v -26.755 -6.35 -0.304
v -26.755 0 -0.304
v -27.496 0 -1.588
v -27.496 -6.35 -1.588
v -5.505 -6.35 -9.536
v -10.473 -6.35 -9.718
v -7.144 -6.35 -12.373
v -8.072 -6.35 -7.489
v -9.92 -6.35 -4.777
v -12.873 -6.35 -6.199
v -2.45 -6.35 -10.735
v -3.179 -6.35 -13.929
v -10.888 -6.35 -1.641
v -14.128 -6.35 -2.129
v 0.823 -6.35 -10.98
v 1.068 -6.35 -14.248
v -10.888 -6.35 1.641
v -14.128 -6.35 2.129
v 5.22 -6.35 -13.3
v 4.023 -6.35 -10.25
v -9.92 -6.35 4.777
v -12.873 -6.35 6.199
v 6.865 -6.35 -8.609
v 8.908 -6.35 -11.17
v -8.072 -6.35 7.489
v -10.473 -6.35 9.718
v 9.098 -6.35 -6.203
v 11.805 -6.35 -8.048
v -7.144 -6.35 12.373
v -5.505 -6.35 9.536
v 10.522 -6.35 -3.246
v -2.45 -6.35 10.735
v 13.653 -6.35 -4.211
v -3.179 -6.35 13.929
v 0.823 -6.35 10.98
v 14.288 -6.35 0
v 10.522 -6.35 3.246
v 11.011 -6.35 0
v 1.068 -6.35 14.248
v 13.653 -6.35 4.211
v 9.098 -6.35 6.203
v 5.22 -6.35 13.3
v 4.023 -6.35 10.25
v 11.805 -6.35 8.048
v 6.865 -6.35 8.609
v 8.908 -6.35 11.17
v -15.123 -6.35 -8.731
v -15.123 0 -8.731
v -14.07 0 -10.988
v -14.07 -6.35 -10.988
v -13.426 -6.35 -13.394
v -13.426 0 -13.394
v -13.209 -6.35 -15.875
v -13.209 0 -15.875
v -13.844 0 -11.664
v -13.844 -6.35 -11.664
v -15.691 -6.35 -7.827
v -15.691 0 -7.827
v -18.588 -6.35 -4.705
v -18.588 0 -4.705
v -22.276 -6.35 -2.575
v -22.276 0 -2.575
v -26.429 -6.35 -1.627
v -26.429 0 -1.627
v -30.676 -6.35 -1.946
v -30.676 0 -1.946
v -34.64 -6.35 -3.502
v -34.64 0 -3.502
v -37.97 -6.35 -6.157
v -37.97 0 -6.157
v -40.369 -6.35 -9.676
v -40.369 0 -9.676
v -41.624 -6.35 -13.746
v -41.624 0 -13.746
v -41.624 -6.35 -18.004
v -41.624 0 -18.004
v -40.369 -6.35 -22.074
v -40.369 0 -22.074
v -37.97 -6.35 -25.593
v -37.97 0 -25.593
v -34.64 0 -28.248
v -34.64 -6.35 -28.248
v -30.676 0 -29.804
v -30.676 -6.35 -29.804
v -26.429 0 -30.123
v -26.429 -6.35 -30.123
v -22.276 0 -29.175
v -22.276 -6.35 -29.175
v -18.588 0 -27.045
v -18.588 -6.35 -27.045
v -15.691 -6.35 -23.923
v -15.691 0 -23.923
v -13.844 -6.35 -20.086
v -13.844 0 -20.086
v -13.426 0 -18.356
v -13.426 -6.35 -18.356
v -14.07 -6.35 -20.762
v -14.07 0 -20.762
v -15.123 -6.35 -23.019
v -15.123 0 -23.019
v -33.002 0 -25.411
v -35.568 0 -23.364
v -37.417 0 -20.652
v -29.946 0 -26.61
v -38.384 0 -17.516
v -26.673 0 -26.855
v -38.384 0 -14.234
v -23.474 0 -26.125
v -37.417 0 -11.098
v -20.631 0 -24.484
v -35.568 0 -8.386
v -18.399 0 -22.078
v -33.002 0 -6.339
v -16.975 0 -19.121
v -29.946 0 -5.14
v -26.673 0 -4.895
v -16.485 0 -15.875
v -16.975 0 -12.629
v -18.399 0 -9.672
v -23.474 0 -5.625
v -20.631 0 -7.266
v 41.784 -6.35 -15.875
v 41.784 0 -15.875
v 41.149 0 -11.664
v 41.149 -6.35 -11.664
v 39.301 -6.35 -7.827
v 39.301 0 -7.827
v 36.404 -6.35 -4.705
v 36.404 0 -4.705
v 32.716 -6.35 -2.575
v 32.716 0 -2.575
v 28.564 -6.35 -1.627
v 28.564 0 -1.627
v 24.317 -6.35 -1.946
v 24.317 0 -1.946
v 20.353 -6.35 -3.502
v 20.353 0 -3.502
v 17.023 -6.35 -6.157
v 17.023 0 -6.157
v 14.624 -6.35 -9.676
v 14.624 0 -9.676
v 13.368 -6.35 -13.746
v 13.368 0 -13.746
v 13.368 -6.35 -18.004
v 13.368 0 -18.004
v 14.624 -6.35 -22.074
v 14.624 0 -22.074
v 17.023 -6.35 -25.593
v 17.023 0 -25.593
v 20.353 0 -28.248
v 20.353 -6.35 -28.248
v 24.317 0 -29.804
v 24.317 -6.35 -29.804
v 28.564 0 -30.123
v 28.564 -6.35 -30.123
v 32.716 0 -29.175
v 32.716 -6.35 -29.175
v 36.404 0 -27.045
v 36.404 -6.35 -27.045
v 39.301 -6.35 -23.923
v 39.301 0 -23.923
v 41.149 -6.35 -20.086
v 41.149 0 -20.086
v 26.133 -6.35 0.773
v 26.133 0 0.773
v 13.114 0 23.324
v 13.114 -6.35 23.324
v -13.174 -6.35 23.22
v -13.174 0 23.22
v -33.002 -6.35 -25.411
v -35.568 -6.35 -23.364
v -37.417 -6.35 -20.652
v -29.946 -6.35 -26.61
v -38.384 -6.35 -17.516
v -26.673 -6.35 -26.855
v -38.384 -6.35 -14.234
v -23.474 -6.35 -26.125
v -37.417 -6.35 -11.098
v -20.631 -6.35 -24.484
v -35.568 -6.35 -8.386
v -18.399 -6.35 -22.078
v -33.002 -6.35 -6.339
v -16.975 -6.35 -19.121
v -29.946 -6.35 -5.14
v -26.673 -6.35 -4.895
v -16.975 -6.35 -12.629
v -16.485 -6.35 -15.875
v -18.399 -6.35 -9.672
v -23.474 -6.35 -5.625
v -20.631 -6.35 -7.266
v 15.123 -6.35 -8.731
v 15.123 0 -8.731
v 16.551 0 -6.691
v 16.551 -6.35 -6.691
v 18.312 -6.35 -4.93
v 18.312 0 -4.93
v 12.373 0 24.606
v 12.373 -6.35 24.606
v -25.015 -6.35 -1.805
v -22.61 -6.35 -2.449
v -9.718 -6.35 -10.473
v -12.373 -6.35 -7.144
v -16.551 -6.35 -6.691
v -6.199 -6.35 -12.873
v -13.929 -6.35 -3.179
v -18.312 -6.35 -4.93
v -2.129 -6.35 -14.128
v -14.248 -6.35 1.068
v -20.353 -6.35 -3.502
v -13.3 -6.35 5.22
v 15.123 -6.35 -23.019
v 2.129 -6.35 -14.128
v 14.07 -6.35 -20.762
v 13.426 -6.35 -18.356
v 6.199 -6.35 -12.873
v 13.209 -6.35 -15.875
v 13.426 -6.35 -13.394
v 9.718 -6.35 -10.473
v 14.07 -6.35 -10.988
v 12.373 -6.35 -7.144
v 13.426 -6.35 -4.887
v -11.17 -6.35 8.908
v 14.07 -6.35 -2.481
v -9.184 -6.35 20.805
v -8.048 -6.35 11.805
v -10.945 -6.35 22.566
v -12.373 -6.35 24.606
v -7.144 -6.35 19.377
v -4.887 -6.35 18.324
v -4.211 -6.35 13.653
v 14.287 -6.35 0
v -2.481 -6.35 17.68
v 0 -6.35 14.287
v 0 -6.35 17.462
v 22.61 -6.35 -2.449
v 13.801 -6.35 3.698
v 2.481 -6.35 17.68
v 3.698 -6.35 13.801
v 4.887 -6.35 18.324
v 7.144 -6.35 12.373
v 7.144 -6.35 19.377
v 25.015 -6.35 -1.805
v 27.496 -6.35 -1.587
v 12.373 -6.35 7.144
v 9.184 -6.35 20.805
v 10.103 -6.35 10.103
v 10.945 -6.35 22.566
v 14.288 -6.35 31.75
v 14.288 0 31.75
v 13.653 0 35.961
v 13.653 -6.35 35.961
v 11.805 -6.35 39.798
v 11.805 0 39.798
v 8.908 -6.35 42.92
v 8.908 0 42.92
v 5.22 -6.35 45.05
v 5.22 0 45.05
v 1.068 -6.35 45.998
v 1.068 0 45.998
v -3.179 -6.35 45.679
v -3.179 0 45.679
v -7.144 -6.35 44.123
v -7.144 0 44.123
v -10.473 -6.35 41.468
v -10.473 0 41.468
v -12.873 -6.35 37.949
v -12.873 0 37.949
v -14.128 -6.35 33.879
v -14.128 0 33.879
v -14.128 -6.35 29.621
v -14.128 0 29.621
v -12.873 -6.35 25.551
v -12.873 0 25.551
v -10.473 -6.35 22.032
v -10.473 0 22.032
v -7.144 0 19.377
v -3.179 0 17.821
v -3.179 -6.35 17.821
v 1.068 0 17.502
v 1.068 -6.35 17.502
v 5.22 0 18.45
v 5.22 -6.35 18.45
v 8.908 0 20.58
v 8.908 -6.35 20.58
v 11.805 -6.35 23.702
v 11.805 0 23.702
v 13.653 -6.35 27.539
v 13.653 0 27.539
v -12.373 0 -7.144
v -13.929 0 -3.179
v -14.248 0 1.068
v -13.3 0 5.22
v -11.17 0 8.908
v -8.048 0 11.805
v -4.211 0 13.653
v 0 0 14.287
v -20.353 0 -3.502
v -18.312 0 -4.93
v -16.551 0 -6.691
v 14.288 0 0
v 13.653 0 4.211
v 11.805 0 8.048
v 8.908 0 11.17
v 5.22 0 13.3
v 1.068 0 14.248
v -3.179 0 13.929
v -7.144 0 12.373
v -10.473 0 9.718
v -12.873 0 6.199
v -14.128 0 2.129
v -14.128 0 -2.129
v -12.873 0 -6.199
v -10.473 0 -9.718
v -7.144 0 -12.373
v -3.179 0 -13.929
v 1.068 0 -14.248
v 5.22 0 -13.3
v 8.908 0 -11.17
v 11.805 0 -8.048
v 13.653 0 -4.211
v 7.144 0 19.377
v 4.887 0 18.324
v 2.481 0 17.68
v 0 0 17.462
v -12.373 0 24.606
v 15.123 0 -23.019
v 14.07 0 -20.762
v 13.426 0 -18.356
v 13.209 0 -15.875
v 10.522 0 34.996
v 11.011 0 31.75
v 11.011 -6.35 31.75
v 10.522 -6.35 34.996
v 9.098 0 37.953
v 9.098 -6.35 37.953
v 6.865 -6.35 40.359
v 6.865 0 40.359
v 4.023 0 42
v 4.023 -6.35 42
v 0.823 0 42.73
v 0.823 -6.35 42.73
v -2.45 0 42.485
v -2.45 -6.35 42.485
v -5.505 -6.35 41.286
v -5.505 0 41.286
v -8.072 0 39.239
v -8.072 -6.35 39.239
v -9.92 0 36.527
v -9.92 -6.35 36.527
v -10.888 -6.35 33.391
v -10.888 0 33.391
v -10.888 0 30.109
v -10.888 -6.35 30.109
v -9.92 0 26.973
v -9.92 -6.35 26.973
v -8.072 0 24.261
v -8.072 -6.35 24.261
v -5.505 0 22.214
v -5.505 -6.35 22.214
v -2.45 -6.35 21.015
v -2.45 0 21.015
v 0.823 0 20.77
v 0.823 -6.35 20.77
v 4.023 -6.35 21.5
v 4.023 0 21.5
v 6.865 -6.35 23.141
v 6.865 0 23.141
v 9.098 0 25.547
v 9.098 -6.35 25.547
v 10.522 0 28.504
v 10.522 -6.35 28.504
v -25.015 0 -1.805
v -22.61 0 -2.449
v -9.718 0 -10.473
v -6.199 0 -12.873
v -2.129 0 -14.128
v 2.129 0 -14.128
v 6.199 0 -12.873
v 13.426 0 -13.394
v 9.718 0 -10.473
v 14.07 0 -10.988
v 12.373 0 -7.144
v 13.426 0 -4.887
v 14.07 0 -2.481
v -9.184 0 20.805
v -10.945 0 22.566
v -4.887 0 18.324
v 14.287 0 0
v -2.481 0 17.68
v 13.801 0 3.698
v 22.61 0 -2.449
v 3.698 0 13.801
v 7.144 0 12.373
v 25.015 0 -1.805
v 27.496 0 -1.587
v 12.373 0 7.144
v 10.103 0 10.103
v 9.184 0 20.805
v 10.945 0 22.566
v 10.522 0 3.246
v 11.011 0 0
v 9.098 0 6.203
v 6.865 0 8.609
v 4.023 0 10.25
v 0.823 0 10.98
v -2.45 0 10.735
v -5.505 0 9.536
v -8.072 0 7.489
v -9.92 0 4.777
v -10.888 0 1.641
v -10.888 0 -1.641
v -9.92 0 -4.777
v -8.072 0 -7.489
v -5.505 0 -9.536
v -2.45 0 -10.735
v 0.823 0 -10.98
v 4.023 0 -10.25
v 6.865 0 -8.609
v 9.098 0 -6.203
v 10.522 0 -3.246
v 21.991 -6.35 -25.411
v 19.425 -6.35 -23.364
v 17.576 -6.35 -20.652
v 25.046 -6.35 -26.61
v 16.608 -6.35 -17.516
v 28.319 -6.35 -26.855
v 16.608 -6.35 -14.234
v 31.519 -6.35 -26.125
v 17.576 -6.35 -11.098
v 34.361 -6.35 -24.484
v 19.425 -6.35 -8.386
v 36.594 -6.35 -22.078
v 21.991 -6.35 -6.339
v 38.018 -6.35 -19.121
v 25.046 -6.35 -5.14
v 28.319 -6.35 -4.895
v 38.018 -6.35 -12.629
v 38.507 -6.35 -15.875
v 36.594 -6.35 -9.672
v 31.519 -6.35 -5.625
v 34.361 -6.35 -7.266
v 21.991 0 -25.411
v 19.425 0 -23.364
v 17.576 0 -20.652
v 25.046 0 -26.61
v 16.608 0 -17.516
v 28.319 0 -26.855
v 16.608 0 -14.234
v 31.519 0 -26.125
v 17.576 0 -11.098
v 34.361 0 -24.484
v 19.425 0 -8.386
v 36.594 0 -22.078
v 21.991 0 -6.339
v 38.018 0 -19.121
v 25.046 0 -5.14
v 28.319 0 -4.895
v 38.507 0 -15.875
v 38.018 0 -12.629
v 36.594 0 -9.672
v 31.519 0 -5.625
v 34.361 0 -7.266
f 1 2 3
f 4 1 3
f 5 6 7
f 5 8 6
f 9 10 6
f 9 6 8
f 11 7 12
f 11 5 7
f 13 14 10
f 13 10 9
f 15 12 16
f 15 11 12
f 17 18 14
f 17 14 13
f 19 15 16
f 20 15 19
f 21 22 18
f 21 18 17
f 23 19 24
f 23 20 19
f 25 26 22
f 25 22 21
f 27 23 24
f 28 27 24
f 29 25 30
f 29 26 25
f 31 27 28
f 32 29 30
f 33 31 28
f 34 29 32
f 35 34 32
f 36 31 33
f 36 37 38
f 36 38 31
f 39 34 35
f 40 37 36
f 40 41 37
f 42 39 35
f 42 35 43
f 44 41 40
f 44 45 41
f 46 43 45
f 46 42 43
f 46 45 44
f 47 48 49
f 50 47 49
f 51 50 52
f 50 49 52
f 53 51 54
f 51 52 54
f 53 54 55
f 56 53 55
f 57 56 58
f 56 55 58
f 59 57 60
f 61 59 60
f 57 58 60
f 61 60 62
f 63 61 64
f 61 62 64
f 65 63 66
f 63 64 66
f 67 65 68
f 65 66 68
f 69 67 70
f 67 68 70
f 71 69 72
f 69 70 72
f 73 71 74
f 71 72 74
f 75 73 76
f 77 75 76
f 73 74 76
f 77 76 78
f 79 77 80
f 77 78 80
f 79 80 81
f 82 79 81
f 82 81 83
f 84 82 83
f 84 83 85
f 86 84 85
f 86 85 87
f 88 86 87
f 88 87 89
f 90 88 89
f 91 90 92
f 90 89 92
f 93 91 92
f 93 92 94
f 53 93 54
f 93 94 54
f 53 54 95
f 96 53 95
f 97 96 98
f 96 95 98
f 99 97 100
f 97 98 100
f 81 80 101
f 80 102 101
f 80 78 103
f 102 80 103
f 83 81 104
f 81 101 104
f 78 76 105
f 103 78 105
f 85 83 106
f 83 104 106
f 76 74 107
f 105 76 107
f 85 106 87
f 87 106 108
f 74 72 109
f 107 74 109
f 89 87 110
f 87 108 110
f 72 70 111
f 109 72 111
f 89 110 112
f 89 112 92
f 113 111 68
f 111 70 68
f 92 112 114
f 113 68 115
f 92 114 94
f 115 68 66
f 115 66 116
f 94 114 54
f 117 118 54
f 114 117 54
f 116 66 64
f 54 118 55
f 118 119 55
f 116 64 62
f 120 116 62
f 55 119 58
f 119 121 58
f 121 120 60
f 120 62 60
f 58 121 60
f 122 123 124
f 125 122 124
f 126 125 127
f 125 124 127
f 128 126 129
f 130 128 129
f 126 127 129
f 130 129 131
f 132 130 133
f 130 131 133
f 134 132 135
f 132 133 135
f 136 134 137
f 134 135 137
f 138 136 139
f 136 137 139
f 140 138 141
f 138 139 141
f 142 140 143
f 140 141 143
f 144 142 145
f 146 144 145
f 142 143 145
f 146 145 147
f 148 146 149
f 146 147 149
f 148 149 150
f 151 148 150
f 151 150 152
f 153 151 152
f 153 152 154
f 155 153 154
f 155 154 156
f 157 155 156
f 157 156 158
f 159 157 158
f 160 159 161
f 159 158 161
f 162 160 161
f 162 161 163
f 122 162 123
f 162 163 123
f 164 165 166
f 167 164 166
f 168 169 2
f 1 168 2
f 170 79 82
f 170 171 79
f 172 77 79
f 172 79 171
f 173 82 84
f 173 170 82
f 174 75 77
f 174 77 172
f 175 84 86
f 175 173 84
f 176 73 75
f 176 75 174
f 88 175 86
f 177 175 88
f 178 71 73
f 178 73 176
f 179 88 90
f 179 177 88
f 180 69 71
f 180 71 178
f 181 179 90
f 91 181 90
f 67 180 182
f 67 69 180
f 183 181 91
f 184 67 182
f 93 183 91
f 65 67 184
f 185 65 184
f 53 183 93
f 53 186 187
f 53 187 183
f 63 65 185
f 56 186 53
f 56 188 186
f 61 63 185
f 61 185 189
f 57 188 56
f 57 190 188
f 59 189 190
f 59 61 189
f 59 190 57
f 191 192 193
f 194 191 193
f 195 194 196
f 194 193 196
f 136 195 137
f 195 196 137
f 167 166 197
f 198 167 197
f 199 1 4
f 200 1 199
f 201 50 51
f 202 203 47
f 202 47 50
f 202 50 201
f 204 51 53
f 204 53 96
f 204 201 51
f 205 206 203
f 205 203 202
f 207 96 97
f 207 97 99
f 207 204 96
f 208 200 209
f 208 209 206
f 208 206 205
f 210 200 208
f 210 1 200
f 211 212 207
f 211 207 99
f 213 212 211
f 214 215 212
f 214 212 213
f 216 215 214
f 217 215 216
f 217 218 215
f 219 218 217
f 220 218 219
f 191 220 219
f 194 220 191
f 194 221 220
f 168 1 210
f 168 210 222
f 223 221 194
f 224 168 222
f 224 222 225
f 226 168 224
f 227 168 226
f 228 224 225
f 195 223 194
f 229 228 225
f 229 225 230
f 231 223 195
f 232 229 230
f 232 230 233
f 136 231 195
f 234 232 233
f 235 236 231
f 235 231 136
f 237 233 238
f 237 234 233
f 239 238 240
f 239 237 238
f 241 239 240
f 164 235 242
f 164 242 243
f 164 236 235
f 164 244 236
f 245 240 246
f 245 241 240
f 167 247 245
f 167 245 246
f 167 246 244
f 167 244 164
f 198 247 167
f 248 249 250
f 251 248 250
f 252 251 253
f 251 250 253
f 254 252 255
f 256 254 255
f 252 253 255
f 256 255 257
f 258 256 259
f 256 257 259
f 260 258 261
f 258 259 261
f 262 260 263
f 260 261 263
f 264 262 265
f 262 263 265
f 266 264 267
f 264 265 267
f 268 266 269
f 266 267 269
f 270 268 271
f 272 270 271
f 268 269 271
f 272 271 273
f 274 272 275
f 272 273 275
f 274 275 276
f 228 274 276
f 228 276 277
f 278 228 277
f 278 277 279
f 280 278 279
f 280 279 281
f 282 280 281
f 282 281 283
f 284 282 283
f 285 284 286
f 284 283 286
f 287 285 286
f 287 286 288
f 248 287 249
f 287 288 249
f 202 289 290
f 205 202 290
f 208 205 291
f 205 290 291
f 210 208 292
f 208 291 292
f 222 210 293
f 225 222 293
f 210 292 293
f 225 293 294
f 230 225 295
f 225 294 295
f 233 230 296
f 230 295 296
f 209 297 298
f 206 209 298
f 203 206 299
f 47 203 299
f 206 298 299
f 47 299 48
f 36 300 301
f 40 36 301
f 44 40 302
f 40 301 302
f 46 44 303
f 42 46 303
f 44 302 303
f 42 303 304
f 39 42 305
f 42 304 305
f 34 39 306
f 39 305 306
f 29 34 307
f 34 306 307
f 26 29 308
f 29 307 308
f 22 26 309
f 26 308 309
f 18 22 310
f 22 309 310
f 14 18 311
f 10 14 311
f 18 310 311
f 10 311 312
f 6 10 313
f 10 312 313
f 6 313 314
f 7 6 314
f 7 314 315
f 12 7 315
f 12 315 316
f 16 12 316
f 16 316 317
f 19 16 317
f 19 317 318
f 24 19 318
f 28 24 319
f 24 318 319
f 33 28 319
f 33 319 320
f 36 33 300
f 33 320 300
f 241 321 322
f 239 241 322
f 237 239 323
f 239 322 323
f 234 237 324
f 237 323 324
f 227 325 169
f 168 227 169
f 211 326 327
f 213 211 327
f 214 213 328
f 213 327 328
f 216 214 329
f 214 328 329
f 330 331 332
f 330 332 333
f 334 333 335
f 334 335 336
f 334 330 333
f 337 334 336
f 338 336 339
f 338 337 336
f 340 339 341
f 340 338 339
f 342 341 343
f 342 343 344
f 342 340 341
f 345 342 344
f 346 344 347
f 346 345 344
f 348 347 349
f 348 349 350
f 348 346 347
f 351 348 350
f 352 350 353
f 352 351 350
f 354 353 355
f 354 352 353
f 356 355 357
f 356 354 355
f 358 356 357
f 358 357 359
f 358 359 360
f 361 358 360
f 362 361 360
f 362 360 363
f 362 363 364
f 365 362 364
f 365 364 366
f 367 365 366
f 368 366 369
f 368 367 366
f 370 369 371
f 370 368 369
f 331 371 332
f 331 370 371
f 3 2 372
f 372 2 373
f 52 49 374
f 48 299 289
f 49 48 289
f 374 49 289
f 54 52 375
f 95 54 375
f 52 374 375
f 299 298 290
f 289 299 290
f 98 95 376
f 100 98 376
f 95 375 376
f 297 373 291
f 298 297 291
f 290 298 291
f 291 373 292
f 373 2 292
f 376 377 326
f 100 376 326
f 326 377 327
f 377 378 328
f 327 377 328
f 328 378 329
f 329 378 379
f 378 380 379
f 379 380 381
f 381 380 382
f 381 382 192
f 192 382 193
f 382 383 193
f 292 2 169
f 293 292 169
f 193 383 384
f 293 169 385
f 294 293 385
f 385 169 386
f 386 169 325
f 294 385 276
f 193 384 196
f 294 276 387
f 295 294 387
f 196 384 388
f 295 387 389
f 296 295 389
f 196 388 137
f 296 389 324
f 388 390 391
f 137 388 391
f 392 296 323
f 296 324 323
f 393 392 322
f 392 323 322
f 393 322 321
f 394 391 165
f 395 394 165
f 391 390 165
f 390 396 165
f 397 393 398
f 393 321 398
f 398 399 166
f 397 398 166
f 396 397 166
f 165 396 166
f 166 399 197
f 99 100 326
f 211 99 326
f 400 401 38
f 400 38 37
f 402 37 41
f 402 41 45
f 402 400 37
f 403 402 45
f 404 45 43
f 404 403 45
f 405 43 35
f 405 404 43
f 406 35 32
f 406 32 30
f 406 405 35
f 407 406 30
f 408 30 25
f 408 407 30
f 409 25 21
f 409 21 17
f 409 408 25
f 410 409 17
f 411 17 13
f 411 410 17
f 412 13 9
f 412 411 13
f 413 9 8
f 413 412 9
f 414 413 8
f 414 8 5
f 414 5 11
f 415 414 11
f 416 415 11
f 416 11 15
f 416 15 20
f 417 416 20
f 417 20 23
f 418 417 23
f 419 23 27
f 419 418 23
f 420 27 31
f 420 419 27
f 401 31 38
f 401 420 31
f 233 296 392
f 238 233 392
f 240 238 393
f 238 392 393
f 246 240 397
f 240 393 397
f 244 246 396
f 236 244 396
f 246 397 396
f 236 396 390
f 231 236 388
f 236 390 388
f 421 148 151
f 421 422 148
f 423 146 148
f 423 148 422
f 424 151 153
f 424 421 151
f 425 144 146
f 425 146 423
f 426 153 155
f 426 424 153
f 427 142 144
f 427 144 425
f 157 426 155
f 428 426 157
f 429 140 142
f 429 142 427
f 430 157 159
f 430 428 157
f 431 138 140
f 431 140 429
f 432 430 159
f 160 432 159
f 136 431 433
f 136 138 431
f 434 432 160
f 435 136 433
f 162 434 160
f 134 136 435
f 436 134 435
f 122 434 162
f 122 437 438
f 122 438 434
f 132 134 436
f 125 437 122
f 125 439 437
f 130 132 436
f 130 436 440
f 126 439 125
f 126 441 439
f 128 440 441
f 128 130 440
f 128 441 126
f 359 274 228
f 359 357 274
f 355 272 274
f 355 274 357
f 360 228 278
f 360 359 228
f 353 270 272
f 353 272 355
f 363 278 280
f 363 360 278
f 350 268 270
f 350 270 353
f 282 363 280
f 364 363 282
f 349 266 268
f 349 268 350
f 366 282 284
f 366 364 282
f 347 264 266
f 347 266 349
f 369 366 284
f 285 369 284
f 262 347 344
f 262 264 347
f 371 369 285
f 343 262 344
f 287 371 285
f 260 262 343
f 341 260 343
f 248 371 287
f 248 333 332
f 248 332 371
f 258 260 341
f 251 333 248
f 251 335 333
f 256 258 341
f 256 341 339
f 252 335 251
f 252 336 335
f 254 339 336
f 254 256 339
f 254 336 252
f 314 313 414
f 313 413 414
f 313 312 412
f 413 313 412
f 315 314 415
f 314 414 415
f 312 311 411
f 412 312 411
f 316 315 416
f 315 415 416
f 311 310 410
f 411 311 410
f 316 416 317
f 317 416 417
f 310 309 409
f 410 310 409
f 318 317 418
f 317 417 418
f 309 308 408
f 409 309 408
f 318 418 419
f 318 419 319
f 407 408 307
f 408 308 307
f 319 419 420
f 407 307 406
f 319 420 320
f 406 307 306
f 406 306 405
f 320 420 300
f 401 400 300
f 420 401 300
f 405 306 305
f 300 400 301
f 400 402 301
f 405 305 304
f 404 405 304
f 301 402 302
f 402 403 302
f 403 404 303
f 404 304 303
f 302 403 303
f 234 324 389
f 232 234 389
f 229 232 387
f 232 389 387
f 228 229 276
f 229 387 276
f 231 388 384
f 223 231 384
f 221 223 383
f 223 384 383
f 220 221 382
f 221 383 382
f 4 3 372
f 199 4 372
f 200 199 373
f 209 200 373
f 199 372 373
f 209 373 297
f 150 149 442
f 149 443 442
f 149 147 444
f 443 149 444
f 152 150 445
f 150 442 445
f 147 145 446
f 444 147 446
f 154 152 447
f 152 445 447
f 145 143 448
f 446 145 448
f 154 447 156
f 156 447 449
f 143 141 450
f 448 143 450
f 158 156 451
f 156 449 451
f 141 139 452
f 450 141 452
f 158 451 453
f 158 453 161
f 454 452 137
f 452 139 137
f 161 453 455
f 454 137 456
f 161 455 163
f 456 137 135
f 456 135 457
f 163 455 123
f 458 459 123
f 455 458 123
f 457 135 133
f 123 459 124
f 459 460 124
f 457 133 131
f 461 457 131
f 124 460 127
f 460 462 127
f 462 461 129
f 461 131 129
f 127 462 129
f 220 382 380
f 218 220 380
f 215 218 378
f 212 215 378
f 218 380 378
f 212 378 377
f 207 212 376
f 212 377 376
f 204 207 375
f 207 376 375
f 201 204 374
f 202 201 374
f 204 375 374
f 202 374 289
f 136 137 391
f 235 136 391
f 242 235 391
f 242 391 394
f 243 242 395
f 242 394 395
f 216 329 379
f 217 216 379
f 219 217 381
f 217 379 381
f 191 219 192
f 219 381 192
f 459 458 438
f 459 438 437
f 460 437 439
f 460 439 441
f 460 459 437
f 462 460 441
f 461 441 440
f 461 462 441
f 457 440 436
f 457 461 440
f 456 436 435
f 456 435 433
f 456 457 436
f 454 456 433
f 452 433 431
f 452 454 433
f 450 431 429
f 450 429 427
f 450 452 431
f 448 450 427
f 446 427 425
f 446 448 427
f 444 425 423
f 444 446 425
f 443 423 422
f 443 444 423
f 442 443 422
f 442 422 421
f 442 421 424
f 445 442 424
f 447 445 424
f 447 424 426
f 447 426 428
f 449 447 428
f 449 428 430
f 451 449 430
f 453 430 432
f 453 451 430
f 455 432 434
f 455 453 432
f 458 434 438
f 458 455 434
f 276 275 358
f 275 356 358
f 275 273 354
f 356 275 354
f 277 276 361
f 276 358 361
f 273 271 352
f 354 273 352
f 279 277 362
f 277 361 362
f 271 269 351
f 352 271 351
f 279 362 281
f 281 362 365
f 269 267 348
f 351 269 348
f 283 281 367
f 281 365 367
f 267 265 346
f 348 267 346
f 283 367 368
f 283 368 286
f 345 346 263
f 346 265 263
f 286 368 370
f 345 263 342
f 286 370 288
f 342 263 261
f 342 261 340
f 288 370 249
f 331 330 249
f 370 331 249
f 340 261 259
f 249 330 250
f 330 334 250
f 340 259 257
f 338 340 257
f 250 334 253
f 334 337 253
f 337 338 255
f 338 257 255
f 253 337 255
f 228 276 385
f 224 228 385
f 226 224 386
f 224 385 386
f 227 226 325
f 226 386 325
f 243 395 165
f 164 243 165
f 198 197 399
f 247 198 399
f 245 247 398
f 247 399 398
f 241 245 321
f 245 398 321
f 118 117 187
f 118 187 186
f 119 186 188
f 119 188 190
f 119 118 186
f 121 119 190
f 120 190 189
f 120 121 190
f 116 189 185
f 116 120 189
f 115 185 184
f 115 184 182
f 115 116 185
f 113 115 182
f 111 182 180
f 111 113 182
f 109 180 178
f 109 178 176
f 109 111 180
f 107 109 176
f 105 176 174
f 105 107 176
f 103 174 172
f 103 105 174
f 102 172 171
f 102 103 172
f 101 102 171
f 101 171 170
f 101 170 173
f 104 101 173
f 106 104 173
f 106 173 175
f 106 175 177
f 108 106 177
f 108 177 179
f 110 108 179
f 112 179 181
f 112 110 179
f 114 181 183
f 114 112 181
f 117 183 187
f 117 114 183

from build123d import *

# Parameters (mm, degrees)
F0_R     = 14.2875
F0_R_2   = 11.0109
F1_DEPTH = 6.35
F3_DEPTH = 6.35


with BuildPart() as f1:
    # F0 (on Front) → F1 (new body)
    with BuildSketch(Plane.XZ):
        with Locations((0, 31.75)):
            Circle(F0_R)
        with Locations((0, 31.75)):
            Circle(F0_R_2, mode=Mode.SUBTRACT)
    extrude(amount=F1_DEPTH)


with BuildPart() as f1b:
    # F0 (on Front) → F1, piece 2 (new body)
    with BuildSketch(Plane.XZ):
        Circle(F0_R)
        Circle(F0_R_2, mode=Mode.SUBTRACT)
    extrude(amount=F1_DEPTH)


with BuildPart() as f1c:
    # F0 (on Front) → F1, piece 3 (new body)
    with BuildSketch(Plane.XZ):
        with Locations((27.4963065702, -15.875)):
            Circle(F0_R)
        with Locations((27.4963065702, -15.875)):
            Circle(F0_R_2, mode=Mode.SUBTRACT)
    extrude(amount=F1_DEPTH)


with BuildPart() as f1d:
    # F0 (on Front) → F1, piece 4 (new body)
    with BuildSketch(Plane.XZ):
        with Locations((-27.4963065702, -15.875)):
            Circle(F0_R)
        with Locations((-27.4963065702, -15.875)):
            Circle(F0_R_2, mode=Mode.SUBTRACT)
    extrude(amount=F1_DEPTH)


with BuildPart() as f3:
    # F2 (on Front) → F3 (new body)
    with BuildSketch(Plane.XZ):
        with BuildLine():
            Line((-13.1735245665, 23.2202861361), (-26.7550475149, -0.3036016547))
            ThreePointArc((-26.7550475149, -0.3036016547), (-16.7530650469, 9.6043429355), (-13.1735245665, 23.2202861361))
        make_face()
        with BuildLine():
            ThreePointArc((-13.1735245665, 23.2202861361), (-16.7530650469, 9.6043429355), (-26.7550475149, -0.3036016547))
            Line((-26.7550475149, -0.3036016547), (-27.4963065702, -1.5875))
            ThreePointArc((-27.4963065702, -1.5875), (-23.7984294633, -2.0743347569), (-20.3525565702, -3.5016620434))
            Line((-20.3525565702, -3.5016620434), (-7.14375, 19.3766620434))
            ThreePointArc((-7.14375, 19.3766620434), (-10.1027881362, 21.6472118638), (-12.3733379566, 24.60625))
            Line((-12.3733379566, 24.60625), (-13.1735245665, 23.2202861361))
        make_face()
        with BuildLine():
            Line((-7.14375, 19.3766620434), (-20.3525565702, -3.5016620434))
            ThreePointArc((-20.3525565702, -3.5016620434), (-17.393518434, -5.7722118638), (-15.1229686136, -8.73125))
            Line((-15.1229686136, -8.73125), (-12.3733379566, -7.14375))
            ThreePointArc((-12.3733379566, -7.14375), (-12.3733379566, 7.14375), (0, 14.2875))
            Line((0, 14.2875), (0, 17.4625))
            ThreePointArc((0, 17.4625), (-3.6978771069, 17.9493347569), (-7.14375, 19.3766620434))
        make_face()
        with BuildLine():
            ThreePointArc((-13.2088065702, -15.875), (-13.6956413271, -19.5728771069), (-15.1229686136, -23.01875))
            Line((-15.1229686136, -23.01875), (-13.8199954558, -23.01875))
            ThreePointArc((-13.8199954558, -23.01875), (-0.0006031297, -18.5930397834), (13.8187891964, -23.01875))
            Line((13.8187891964, -23.01875), (15.1229686136, -23.01875))
            ThreePointArc((15.1229686136, -23.01875), (13.6956413271, -19.5728771069), (13.2088065702, -15.875))
            Line((13.2088065702, -15.875), (-13.2088065702, -15.875))
        make_face()
        with BuildLine():
            Line((-12.3733379566, -7.14375), (-15.1229686136, -8.73125))
            ThreePointArc((-15.1229686136, -8.73125), (-13.6956413271, -12.1771228931), (-13.2088065702, -15.875))
            Line((-13.2088065702, -15.875), (13.2088065702, -15.875))
            ThreePointArc((13.2088065702, -15.875), (13.6956413271, -12.1771228931), (15.1229686136, -8.73125))
            Line((15.1229686136, -8.73125), (12.3733379566, -7.14375))
            ThreePointArc((12.3733379566, -7.14375), (0, -14.2875), (-12.3733379566, -7.14375))
        make_face()
        with BuildLine():
            ThreePointArc((13.8187891964, -23.01875), (-0.0006031297, -18.5930397834), (-13.8199954558, -23.01875))
            Line((-13.8199954558, -23.01875), (13.8187891964, -23.01875))
        make_face()
        with BuildLine():
            ThreePointArc((7.14375, 19.3766620434), (3.6978771069, 17.9493347569), (0, 17.4625))
            Line((0, 17.4625), (0, 14.2875))
            ThreePointArc((0, 14.2875), (10.1027881362, 10.1027881362), (14.2875, 0))
            ThreePointArc((14.2875, 0), (13.8006652431, -3.6978771069), (12.3733379566, -7.14375))
            Line((12.3733379566, -7.14375), (15.1229686136, -8.73125))
            ThreePointArc((15.1229686136, -8.73125), (17.393518434, -5.7722118638), (20.3525565702, -3.5016620434))
            Line((20.3525565702, -3.5016620434), (7.14375, 19.3766620434))
        make_face()
        with BuildLine():
            ThreePointArc((12.3733379566, 24.60625), (10.1027881362, 21.6472118638), (7.14375, 19.3766620434))
            Line((7.14375, 19.3766620434), (20.3525565702, -3.5016620434))
            ThreePointArc((20.3525565702, -3.5016620434), (23.7984294633, -2.0743347569), (27.4963065702, -1.5875))
            Line((27.4963065702, -1.5875), (26.1332062792, 0.7734589597))
            ThreePointArc((26.1332062792, 0.7734589597), (16.8650497396, 10.4561422475), (13.1136783054, 23.323942901))
            Line((13.1136783054, 23.323942901), (12.3733379566, 24.60625))
        make_face()
        with BuildLine():
            Line((26.1332062792, 0.7734589597), (13.1136783054, 23.323942901))
            ThreePointArc((13.1136783054, 23.323942901), (16.8650497396, 10.4561422475), (26.1332062792, 0.7734589597))
        make_face()
    extrude(amount=F3_DEPTH)


solid = Compound([f1.part, f1b.part, f1c.part, f1d.part, f3.part])
